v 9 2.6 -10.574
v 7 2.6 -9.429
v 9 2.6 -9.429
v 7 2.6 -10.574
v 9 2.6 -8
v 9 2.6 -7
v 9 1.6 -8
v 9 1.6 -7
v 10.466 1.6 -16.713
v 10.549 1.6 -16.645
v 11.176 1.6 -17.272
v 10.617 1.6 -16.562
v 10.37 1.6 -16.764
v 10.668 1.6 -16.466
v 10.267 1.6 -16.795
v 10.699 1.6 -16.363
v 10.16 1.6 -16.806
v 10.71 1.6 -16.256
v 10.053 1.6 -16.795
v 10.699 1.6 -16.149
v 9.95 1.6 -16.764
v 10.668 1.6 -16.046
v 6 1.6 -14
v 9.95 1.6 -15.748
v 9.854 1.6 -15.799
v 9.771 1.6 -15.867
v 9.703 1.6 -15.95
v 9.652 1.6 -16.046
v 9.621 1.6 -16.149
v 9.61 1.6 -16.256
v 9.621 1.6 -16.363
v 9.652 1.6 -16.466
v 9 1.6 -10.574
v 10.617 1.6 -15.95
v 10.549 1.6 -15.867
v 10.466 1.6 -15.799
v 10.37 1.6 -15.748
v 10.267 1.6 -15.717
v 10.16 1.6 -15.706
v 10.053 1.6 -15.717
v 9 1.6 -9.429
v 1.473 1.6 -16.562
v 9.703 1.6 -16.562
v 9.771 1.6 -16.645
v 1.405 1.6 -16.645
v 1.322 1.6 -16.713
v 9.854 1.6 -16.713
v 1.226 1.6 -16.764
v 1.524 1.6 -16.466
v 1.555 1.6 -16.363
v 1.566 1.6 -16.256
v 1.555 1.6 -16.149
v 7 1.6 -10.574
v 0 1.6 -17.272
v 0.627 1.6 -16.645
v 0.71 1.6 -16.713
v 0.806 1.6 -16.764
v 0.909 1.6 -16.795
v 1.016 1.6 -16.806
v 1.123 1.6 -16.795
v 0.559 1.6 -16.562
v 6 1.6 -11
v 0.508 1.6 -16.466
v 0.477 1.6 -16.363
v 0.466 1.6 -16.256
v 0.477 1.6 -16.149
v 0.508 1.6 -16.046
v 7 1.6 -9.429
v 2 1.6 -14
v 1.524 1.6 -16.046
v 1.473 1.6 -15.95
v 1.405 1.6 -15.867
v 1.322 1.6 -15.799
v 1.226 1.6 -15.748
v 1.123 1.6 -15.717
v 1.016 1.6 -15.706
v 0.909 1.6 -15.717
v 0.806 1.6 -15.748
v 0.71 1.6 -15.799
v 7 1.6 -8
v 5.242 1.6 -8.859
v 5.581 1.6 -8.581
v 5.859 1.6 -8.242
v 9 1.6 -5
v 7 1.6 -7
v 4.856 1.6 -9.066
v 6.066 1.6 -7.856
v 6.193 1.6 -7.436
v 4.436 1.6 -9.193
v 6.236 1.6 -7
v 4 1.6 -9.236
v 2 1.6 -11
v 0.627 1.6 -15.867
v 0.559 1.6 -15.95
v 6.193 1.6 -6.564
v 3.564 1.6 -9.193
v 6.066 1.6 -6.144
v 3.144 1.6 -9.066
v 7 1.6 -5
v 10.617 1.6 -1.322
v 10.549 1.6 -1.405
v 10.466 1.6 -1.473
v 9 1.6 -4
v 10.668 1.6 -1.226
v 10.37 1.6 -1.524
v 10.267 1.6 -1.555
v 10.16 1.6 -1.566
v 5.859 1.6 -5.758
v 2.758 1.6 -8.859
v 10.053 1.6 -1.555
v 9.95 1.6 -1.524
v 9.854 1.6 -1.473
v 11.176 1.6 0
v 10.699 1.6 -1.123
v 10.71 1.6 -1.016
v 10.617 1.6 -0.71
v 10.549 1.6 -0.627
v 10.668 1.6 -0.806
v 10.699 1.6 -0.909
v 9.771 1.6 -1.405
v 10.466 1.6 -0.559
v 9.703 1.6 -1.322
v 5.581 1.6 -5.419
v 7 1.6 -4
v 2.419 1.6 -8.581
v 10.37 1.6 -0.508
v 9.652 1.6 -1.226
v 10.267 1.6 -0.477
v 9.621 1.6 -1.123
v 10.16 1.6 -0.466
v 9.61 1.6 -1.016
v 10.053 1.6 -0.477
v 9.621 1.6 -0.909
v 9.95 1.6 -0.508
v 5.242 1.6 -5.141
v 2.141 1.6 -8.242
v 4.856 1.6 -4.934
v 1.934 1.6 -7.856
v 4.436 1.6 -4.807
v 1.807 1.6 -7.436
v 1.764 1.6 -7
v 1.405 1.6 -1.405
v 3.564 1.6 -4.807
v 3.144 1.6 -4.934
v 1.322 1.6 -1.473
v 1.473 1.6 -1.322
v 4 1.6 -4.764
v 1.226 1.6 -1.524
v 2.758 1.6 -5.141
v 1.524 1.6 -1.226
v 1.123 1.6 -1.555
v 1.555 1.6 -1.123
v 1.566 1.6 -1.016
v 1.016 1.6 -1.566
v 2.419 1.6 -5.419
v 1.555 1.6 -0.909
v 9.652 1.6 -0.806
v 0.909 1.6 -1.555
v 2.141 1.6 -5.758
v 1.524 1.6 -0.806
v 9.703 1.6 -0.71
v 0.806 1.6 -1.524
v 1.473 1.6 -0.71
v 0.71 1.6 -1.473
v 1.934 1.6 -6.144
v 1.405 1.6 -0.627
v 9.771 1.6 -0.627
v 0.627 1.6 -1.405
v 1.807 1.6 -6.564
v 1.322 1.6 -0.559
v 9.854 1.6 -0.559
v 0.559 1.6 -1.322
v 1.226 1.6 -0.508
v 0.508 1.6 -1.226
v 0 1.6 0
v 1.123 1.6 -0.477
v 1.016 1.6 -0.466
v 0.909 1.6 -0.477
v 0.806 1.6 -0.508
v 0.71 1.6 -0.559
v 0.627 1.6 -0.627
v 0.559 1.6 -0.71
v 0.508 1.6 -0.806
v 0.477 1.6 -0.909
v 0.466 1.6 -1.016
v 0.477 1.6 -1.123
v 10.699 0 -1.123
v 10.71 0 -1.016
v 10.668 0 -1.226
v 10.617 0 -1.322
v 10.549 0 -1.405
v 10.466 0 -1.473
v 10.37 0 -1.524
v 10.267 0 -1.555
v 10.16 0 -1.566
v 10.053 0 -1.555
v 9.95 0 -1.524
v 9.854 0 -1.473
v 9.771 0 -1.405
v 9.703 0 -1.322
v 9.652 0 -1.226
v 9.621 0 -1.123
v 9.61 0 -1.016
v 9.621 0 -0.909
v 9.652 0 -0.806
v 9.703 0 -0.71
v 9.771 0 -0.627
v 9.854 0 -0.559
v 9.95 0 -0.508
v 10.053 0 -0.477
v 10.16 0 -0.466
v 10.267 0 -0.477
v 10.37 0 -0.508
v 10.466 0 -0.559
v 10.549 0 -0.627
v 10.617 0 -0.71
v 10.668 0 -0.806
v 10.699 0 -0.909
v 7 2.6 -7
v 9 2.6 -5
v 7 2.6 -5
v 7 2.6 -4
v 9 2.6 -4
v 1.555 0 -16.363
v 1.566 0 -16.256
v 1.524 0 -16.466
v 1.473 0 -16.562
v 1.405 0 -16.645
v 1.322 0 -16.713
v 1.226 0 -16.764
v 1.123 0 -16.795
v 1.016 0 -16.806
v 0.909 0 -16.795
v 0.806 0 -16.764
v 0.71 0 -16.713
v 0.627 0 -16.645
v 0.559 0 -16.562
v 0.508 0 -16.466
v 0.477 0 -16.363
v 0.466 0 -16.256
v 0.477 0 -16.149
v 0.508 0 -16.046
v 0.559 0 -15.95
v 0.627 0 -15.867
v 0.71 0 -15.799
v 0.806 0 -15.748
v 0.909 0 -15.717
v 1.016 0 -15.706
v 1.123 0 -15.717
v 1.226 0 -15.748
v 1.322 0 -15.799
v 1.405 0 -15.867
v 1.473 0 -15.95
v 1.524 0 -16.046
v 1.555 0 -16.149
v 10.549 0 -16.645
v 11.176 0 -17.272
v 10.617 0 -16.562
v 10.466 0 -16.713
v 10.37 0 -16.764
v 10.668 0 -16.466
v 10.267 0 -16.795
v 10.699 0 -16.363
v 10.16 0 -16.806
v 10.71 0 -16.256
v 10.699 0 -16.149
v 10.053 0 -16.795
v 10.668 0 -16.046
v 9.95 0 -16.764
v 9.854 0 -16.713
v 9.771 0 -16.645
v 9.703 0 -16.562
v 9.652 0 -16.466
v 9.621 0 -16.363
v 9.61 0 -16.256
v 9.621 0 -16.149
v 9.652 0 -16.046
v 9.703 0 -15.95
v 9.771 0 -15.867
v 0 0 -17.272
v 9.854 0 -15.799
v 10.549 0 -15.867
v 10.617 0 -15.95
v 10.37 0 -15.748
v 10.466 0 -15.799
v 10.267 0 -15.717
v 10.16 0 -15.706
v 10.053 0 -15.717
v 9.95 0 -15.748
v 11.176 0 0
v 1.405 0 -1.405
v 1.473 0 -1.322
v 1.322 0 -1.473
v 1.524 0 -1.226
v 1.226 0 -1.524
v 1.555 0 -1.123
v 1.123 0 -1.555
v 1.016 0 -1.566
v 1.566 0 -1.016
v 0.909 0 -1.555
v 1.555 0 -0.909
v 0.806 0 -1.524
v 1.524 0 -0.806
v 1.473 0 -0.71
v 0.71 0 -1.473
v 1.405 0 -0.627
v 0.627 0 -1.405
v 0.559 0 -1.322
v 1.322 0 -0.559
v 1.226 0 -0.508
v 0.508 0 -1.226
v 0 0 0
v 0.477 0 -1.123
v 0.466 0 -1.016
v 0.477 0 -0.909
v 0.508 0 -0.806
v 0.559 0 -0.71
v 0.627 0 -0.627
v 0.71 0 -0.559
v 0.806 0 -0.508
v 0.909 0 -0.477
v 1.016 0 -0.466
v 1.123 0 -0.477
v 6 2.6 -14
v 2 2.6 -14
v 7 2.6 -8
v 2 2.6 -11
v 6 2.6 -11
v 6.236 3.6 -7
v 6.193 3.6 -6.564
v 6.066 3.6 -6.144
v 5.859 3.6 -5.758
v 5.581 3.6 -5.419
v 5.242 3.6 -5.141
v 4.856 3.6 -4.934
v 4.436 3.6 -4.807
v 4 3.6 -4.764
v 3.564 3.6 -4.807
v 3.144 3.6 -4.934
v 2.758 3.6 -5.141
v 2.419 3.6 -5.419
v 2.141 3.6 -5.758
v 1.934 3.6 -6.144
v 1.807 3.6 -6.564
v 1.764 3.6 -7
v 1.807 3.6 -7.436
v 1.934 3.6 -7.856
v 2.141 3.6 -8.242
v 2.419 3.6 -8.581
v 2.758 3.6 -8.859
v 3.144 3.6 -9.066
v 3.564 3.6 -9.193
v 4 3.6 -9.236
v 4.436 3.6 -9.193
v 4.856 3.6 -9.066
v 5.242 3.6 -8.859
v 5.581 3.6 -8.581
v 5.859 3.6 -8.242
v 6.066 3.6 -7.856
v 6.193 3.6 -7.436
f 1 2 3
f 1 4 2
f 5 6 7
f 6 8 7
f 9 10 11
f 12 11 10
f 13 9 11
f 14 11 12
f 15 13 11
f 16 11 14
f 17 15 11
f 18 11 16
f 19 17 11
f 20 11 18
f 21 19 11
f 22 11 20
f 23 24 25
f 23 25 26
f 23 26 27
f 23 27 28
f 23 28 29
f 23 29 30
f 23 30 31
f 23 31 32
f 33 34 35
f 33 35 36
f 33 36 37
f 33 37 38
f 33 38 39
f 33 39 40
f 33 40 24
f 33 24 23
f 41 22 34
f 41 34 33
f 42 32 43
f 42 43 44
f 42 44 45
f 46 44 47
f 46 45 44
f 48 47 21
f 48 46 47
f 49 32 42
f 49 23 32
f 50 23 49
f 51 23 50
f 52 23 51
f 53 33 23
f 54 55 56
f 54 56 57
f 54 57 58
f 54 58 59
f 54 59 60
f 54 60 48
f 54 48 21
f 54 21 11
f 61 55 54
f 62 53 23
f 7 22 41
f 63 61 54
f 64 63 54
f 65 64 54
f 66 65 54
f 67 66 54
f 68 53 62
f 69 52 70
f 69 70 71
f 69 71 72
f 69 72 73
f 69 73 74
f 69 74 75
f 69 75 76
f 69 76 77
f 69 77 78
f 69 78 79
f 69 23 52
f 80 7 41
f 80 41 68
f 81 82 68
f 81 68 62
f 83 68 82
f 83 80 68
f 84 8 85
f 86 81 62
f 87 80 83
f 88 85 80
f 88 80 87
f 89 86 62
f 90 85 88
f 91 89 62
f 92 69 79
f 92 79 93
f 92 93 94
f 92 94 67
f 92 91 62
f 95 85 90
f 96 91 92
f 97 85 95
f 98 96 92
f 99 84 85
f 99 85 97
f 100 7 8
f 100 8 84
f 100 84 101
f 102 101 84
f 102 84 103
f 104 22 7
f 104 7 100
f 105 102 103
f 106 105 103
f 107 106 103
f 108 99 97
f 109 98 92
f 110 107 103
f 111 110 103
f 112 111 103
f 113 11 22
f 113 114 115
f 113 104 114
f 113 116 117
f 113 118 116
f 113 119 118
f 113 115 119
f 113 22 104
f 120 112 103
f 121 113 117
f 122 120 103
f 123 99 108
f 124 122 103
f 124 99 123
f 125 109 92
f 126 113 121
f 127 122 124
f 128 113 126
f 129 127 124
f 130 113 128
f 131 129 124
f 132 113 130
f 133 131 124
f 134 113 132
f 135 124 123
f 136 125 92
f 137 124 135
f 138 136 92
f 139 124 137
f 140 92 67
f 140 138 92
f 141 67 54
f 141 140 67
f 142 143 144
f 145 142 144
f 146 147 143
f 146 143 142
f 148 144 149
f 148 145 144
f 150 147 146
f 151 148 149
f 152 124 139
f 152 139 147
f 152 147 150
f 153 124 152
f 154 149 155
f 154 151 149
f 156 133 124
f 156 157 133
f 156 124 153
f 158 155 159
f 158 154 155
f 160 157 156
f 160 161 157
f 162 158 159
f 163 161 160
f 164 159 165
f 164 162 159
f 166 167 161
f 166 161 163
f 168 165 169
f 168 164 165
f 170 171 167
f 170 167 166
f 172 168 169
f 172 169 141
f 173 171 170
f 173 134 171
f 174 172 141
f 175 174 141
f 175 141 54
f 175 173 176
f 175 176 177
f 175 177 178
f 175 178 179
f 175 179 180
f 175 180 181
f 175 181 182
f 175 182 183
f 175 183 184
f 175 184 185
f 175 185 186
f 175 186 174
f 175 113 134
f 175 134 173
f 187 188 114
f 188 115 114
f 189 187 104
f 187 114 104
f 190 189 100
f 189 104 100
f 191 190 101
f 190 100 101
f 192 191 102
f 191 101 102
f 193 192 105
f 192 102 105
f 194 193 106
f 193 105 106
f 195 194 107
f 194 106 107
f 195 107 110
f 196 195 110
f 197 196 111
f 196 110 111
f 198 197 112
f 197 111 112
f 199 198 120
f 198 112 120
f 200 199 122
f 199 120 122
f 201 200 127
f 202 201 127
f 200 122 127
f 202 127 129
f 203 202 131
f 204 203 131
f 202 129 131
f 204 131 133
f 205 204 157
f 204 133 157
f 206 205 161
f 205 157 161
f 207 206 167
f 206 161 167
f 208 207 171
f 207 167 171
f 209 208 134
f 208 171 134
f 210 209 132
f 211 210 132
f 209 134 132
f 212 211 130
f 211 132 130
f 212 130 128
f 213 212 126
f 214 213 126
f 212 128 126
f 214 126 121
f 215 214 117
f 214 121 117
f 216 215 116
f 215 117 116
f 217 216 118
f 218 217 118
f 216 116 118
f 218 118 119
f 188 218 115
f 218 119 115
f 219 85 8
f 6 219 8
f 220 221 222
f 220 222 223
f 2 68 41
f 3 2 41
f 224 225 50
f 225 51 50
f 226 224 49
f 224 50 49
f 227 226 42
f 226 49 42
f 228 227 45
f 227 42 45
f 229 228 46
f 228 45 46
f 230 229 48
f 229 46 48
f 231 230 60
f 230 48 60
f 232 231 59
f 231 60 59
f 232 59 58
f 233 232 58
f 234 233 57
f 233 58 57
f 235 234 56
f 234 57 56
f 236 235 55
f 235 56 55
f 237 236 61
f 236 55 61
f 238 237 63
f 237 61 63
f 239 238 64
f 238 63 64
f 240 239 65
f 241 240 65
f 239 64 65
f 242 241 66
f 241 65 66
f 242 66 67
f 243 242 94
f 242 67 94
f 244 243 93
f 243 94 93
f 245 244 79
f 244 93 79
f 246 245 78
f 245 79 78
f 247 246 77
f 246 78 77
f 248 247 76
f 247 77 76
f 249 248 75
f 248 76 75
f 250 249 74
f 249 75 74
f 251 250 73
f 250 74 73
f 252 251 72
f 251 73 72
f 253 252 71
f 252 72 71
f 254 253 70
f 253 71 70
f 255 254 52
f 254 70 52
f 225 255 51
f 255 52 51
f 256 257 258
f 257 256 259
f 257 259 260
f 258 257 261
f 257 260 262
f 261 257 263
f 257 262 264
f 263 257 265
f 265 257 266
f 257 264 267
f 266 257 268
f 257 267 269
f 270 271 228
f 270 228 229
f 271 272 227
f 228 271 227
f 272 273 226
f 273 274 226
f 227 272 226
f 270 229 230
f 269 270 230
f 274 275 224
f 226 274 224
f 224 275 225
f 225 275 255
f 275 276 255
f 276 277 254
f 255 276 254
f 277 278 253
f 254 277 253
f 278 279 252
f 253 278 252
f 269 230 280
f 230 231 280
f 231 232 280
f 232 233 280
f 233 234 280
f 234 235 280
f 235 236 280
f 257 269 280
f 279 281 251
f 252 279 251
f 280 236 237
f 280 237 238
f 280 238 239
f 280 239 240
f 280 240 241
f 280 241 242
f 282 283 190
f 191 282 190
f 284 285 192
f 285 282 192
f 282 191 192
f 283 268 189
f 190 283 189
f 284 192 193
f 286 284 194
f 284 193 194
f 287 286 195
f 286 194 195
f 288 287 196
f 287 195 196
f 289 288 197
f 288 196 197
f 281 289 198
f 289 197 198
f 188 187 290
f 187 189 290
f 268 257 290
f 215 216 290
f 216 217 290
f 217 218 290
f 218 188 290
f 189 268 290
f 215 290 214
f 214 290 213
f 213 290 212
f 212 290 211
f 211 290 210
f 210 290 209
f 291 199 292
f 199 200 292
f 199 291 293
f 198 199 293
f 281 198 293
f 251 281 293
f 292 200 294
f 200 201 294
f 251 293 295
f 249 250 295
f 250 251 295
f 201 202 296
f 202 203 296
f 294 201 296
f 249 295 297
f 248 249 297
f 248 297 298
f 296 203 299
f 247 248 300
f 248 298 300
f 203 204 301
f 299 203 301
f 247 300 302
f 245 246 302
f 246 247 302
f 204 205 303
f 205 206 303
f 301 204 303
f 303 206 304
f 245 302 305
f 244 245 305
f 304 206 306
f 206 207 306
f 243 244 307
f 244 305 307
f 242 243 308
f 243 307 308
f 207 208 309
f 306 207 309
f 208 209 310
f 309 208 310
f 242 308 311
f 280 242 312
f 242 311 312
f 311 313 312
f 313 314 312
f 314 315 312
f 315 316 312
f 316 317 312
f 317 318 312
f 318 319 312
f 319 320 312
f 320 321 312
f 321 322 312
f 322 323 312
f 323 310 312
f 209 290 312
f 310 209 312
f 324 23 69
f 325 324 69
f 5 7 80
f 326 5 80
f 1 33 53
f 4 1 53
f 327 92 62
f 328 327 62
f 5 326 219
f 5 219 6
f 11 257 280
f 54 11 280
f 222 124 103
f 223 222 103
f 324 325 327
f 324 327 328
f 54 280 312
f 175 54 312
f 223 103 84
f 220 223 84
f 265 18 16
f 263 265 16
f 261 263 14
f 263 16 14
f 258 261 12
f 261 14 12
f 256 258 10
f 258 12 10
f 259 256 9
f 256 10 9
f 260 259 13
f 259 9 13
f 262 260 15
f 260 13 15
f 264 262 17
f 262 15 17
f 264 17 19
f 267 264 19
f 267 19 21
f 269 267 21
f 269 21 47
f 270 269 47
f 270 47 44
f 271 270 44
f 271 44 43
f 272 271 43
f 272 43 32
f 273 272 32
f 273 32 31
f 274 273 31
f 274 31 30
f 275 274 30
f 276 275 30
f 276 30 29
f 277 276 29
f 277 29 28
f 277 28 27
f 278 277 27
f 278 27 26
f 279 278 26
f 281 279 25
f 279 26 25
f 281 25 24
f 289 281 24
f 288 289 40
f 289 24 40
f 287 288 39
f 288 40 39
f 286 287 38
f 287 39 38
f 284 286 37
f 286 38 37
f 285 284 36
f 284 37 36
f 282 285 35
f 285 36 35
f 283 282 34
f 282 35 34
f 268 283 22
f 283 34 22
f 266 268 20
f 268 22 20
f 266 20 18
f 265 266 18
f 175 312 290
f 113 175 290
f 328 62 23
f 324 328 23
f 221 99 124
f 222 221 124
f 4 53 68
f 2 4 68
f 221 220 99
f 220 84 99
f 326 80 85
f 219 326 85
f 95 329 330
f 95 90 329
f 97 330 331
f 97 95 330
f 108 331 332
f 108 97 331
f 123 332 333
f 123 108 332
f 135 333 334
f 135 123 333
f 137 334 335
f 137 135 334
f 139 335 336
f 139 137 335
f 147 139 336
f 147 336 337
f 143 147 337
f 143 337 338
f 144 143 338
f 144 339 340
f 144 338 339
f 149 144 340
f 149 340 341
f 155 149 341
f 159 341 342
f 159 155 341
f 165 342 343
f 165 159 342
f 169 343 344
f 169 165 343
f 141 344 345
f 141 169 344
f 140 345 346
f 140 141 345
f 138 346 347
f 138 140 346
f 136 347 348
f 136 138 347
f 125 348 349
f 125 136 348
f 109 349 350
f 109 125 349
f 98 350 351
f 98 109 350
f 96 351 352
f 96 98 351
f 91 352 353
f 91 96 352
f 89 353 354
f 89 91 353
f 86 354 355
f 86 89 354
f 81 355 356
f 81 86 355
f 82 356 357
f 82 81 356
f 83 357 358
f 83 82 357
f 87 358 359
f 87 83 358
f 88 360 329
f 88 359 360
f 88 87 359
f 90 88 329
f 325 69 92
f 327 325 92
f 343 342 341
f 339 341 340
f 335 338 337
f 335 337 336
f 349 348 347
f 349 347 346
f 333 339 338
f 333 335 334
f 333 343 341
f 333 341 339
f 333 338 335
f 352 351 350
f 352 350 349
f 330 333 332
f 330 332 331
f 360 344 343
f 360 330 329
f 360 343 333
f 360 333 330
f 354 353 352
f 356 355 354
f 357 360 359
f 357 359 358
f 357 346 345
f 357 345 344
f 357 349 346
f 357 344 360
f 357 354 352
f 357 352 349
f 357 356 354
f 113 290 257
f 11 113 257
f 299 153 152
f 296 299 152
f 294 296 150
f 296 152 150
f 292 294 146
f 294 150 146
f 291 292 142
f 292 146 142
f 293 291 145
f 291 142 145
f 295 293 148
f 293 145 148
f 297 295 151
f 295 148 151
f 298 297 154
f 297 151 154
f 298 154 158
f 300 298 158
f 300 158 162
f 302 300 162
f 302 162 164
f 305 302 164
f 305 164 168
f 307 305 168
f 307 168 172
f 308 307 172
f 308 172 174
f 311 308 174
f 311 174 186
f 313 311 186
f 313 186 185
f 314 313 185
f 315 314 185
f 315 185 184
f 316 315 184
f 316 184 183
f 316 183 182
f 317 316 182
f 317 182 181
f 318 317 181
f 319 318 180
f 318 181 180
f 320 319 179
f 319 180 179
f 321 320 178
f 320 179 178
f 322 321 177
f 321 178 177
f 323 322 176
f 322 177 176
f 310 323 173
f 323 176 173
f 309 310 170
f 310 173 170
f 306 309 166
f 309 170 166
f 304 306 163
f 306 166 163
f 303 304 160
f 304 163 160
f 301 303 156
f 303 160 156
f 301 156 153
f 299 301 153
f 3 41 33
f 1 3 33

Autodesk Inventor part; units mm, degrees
ref_plane "YZ Plane" through (0, 0, 0) normal (1, 0, 0) x (0, 1, 0)
ref_plane "XZ Plane" through (0, 0, 0) normal (0, 1, 0) x (-1, 0, 0)
ref_plane "XY Plane" through (0, 0, 0) normal (0, 0, 1) x (1, 0, 0)
sketch "Szkic1" plane through (0, 0, 0) normal (0, 1, 0) x (-1, 0, 0)
  line L0 (0, 0) -> (-11.176, 0)
  line L1 (-11.176, 0) -> (-11.176, -17.272)
  line L2 (-11.176, -17.272) -> (0, -17.272)
  line L3 (0, -17.272) -> (0, 0)
  dimension "d0" = 17.272
  dimension "d1" = 11.176
extrude "Wyciągnięcie proste1" add sketch "Szkic1" along normal blind 1.6
sketch "Szkic2" plane through (0, 1.6, 0) normal (0, 1, 0) x (1, 0, 0)
  line L0 (11.176, 0) -> (11.176, 17.272) projected
  line L1 (11.176, 17.272) -> (0, 17.272) projected
  line L2 (0, 17.272) -> (0, 0) projected
  line L3 (0, 0) -> (11.176, 0) projected
  circle A0 centre (1.016, 1.016) radius 0.55
  circle A1 centre (1.016, 16.256) radius 0.55
  circle A2 centre (10.16, 1.016) radius 0.55
  circle A3 centre (10.16, 16.256) radius 0.55
  line L4 (1.016, 1.016) -> (1.016, 16.256)
  line L5 (1.016, 16.256) -> (10.16, 16.256)
  point P0 (1.016, 8.636)
  point P1 (0, 8.636)
  point P2 (5.588, 16.256)
  point P3 (5.588, 17.272)
  dimension "d4" = 1.1
  dimension "d5" = 1.1
  dimension "d6" = 1.1
  dimension "d7" = 1.1
  dimension "d8" = 15.24
  dimension "d9" = 9.144
extrude "Wyciągnięcie proste2" cut sketch "Szkic2" against normal through all contours A0 | A3 | A1 L5 L4 | L4 L5 A1 | A2
sketch "Szkic3" plane through (0, 1.6, 0) normal (0, 1, 0) x (1, 0, 0)
  circle A0 centre (4, 7) radius 2.2361
  line L0 (7, 4) -> (9, 4)
  line L1 (9, 4) -> (9, 5)
  line L2 (9, 5) -> (7, 5)
  line L3 (7, 5) -> (7, 4)
  line L4 (7, 7) -> (9, 7)
  line L5 (9, 7) -> (9, 8)
  line L6 (9, 8) -> (7, 8)
  line L7 (7, 8) -> (7, 7)
  line L8 (7, 9.4289) -> (9, 9.4289)
  line L9 (9, 9.4289) -> (9, 10.5737)
  line L10 (9, 10.5737) -> (7, 10.5737)
  line L11 (7, 10.5737) -> (7, 9.4289)
  line L12 (2, 11) -> (6, 11)
  line L13 (6, 11) -> (6, 14)
  line L14 (6, 14) -> (2, 14)
  line L15 (2, 14) -> (2, 11)
  point P0 (0, 0)
extrude "Wyciągnięcie proste3" add sketch "Szkic3" along normal blind 1
extrude "Wyciągnięcie proste4" add sketch "Szkic3" along normal blind 2 contours A0
properties part number "MH-MINI-360"
